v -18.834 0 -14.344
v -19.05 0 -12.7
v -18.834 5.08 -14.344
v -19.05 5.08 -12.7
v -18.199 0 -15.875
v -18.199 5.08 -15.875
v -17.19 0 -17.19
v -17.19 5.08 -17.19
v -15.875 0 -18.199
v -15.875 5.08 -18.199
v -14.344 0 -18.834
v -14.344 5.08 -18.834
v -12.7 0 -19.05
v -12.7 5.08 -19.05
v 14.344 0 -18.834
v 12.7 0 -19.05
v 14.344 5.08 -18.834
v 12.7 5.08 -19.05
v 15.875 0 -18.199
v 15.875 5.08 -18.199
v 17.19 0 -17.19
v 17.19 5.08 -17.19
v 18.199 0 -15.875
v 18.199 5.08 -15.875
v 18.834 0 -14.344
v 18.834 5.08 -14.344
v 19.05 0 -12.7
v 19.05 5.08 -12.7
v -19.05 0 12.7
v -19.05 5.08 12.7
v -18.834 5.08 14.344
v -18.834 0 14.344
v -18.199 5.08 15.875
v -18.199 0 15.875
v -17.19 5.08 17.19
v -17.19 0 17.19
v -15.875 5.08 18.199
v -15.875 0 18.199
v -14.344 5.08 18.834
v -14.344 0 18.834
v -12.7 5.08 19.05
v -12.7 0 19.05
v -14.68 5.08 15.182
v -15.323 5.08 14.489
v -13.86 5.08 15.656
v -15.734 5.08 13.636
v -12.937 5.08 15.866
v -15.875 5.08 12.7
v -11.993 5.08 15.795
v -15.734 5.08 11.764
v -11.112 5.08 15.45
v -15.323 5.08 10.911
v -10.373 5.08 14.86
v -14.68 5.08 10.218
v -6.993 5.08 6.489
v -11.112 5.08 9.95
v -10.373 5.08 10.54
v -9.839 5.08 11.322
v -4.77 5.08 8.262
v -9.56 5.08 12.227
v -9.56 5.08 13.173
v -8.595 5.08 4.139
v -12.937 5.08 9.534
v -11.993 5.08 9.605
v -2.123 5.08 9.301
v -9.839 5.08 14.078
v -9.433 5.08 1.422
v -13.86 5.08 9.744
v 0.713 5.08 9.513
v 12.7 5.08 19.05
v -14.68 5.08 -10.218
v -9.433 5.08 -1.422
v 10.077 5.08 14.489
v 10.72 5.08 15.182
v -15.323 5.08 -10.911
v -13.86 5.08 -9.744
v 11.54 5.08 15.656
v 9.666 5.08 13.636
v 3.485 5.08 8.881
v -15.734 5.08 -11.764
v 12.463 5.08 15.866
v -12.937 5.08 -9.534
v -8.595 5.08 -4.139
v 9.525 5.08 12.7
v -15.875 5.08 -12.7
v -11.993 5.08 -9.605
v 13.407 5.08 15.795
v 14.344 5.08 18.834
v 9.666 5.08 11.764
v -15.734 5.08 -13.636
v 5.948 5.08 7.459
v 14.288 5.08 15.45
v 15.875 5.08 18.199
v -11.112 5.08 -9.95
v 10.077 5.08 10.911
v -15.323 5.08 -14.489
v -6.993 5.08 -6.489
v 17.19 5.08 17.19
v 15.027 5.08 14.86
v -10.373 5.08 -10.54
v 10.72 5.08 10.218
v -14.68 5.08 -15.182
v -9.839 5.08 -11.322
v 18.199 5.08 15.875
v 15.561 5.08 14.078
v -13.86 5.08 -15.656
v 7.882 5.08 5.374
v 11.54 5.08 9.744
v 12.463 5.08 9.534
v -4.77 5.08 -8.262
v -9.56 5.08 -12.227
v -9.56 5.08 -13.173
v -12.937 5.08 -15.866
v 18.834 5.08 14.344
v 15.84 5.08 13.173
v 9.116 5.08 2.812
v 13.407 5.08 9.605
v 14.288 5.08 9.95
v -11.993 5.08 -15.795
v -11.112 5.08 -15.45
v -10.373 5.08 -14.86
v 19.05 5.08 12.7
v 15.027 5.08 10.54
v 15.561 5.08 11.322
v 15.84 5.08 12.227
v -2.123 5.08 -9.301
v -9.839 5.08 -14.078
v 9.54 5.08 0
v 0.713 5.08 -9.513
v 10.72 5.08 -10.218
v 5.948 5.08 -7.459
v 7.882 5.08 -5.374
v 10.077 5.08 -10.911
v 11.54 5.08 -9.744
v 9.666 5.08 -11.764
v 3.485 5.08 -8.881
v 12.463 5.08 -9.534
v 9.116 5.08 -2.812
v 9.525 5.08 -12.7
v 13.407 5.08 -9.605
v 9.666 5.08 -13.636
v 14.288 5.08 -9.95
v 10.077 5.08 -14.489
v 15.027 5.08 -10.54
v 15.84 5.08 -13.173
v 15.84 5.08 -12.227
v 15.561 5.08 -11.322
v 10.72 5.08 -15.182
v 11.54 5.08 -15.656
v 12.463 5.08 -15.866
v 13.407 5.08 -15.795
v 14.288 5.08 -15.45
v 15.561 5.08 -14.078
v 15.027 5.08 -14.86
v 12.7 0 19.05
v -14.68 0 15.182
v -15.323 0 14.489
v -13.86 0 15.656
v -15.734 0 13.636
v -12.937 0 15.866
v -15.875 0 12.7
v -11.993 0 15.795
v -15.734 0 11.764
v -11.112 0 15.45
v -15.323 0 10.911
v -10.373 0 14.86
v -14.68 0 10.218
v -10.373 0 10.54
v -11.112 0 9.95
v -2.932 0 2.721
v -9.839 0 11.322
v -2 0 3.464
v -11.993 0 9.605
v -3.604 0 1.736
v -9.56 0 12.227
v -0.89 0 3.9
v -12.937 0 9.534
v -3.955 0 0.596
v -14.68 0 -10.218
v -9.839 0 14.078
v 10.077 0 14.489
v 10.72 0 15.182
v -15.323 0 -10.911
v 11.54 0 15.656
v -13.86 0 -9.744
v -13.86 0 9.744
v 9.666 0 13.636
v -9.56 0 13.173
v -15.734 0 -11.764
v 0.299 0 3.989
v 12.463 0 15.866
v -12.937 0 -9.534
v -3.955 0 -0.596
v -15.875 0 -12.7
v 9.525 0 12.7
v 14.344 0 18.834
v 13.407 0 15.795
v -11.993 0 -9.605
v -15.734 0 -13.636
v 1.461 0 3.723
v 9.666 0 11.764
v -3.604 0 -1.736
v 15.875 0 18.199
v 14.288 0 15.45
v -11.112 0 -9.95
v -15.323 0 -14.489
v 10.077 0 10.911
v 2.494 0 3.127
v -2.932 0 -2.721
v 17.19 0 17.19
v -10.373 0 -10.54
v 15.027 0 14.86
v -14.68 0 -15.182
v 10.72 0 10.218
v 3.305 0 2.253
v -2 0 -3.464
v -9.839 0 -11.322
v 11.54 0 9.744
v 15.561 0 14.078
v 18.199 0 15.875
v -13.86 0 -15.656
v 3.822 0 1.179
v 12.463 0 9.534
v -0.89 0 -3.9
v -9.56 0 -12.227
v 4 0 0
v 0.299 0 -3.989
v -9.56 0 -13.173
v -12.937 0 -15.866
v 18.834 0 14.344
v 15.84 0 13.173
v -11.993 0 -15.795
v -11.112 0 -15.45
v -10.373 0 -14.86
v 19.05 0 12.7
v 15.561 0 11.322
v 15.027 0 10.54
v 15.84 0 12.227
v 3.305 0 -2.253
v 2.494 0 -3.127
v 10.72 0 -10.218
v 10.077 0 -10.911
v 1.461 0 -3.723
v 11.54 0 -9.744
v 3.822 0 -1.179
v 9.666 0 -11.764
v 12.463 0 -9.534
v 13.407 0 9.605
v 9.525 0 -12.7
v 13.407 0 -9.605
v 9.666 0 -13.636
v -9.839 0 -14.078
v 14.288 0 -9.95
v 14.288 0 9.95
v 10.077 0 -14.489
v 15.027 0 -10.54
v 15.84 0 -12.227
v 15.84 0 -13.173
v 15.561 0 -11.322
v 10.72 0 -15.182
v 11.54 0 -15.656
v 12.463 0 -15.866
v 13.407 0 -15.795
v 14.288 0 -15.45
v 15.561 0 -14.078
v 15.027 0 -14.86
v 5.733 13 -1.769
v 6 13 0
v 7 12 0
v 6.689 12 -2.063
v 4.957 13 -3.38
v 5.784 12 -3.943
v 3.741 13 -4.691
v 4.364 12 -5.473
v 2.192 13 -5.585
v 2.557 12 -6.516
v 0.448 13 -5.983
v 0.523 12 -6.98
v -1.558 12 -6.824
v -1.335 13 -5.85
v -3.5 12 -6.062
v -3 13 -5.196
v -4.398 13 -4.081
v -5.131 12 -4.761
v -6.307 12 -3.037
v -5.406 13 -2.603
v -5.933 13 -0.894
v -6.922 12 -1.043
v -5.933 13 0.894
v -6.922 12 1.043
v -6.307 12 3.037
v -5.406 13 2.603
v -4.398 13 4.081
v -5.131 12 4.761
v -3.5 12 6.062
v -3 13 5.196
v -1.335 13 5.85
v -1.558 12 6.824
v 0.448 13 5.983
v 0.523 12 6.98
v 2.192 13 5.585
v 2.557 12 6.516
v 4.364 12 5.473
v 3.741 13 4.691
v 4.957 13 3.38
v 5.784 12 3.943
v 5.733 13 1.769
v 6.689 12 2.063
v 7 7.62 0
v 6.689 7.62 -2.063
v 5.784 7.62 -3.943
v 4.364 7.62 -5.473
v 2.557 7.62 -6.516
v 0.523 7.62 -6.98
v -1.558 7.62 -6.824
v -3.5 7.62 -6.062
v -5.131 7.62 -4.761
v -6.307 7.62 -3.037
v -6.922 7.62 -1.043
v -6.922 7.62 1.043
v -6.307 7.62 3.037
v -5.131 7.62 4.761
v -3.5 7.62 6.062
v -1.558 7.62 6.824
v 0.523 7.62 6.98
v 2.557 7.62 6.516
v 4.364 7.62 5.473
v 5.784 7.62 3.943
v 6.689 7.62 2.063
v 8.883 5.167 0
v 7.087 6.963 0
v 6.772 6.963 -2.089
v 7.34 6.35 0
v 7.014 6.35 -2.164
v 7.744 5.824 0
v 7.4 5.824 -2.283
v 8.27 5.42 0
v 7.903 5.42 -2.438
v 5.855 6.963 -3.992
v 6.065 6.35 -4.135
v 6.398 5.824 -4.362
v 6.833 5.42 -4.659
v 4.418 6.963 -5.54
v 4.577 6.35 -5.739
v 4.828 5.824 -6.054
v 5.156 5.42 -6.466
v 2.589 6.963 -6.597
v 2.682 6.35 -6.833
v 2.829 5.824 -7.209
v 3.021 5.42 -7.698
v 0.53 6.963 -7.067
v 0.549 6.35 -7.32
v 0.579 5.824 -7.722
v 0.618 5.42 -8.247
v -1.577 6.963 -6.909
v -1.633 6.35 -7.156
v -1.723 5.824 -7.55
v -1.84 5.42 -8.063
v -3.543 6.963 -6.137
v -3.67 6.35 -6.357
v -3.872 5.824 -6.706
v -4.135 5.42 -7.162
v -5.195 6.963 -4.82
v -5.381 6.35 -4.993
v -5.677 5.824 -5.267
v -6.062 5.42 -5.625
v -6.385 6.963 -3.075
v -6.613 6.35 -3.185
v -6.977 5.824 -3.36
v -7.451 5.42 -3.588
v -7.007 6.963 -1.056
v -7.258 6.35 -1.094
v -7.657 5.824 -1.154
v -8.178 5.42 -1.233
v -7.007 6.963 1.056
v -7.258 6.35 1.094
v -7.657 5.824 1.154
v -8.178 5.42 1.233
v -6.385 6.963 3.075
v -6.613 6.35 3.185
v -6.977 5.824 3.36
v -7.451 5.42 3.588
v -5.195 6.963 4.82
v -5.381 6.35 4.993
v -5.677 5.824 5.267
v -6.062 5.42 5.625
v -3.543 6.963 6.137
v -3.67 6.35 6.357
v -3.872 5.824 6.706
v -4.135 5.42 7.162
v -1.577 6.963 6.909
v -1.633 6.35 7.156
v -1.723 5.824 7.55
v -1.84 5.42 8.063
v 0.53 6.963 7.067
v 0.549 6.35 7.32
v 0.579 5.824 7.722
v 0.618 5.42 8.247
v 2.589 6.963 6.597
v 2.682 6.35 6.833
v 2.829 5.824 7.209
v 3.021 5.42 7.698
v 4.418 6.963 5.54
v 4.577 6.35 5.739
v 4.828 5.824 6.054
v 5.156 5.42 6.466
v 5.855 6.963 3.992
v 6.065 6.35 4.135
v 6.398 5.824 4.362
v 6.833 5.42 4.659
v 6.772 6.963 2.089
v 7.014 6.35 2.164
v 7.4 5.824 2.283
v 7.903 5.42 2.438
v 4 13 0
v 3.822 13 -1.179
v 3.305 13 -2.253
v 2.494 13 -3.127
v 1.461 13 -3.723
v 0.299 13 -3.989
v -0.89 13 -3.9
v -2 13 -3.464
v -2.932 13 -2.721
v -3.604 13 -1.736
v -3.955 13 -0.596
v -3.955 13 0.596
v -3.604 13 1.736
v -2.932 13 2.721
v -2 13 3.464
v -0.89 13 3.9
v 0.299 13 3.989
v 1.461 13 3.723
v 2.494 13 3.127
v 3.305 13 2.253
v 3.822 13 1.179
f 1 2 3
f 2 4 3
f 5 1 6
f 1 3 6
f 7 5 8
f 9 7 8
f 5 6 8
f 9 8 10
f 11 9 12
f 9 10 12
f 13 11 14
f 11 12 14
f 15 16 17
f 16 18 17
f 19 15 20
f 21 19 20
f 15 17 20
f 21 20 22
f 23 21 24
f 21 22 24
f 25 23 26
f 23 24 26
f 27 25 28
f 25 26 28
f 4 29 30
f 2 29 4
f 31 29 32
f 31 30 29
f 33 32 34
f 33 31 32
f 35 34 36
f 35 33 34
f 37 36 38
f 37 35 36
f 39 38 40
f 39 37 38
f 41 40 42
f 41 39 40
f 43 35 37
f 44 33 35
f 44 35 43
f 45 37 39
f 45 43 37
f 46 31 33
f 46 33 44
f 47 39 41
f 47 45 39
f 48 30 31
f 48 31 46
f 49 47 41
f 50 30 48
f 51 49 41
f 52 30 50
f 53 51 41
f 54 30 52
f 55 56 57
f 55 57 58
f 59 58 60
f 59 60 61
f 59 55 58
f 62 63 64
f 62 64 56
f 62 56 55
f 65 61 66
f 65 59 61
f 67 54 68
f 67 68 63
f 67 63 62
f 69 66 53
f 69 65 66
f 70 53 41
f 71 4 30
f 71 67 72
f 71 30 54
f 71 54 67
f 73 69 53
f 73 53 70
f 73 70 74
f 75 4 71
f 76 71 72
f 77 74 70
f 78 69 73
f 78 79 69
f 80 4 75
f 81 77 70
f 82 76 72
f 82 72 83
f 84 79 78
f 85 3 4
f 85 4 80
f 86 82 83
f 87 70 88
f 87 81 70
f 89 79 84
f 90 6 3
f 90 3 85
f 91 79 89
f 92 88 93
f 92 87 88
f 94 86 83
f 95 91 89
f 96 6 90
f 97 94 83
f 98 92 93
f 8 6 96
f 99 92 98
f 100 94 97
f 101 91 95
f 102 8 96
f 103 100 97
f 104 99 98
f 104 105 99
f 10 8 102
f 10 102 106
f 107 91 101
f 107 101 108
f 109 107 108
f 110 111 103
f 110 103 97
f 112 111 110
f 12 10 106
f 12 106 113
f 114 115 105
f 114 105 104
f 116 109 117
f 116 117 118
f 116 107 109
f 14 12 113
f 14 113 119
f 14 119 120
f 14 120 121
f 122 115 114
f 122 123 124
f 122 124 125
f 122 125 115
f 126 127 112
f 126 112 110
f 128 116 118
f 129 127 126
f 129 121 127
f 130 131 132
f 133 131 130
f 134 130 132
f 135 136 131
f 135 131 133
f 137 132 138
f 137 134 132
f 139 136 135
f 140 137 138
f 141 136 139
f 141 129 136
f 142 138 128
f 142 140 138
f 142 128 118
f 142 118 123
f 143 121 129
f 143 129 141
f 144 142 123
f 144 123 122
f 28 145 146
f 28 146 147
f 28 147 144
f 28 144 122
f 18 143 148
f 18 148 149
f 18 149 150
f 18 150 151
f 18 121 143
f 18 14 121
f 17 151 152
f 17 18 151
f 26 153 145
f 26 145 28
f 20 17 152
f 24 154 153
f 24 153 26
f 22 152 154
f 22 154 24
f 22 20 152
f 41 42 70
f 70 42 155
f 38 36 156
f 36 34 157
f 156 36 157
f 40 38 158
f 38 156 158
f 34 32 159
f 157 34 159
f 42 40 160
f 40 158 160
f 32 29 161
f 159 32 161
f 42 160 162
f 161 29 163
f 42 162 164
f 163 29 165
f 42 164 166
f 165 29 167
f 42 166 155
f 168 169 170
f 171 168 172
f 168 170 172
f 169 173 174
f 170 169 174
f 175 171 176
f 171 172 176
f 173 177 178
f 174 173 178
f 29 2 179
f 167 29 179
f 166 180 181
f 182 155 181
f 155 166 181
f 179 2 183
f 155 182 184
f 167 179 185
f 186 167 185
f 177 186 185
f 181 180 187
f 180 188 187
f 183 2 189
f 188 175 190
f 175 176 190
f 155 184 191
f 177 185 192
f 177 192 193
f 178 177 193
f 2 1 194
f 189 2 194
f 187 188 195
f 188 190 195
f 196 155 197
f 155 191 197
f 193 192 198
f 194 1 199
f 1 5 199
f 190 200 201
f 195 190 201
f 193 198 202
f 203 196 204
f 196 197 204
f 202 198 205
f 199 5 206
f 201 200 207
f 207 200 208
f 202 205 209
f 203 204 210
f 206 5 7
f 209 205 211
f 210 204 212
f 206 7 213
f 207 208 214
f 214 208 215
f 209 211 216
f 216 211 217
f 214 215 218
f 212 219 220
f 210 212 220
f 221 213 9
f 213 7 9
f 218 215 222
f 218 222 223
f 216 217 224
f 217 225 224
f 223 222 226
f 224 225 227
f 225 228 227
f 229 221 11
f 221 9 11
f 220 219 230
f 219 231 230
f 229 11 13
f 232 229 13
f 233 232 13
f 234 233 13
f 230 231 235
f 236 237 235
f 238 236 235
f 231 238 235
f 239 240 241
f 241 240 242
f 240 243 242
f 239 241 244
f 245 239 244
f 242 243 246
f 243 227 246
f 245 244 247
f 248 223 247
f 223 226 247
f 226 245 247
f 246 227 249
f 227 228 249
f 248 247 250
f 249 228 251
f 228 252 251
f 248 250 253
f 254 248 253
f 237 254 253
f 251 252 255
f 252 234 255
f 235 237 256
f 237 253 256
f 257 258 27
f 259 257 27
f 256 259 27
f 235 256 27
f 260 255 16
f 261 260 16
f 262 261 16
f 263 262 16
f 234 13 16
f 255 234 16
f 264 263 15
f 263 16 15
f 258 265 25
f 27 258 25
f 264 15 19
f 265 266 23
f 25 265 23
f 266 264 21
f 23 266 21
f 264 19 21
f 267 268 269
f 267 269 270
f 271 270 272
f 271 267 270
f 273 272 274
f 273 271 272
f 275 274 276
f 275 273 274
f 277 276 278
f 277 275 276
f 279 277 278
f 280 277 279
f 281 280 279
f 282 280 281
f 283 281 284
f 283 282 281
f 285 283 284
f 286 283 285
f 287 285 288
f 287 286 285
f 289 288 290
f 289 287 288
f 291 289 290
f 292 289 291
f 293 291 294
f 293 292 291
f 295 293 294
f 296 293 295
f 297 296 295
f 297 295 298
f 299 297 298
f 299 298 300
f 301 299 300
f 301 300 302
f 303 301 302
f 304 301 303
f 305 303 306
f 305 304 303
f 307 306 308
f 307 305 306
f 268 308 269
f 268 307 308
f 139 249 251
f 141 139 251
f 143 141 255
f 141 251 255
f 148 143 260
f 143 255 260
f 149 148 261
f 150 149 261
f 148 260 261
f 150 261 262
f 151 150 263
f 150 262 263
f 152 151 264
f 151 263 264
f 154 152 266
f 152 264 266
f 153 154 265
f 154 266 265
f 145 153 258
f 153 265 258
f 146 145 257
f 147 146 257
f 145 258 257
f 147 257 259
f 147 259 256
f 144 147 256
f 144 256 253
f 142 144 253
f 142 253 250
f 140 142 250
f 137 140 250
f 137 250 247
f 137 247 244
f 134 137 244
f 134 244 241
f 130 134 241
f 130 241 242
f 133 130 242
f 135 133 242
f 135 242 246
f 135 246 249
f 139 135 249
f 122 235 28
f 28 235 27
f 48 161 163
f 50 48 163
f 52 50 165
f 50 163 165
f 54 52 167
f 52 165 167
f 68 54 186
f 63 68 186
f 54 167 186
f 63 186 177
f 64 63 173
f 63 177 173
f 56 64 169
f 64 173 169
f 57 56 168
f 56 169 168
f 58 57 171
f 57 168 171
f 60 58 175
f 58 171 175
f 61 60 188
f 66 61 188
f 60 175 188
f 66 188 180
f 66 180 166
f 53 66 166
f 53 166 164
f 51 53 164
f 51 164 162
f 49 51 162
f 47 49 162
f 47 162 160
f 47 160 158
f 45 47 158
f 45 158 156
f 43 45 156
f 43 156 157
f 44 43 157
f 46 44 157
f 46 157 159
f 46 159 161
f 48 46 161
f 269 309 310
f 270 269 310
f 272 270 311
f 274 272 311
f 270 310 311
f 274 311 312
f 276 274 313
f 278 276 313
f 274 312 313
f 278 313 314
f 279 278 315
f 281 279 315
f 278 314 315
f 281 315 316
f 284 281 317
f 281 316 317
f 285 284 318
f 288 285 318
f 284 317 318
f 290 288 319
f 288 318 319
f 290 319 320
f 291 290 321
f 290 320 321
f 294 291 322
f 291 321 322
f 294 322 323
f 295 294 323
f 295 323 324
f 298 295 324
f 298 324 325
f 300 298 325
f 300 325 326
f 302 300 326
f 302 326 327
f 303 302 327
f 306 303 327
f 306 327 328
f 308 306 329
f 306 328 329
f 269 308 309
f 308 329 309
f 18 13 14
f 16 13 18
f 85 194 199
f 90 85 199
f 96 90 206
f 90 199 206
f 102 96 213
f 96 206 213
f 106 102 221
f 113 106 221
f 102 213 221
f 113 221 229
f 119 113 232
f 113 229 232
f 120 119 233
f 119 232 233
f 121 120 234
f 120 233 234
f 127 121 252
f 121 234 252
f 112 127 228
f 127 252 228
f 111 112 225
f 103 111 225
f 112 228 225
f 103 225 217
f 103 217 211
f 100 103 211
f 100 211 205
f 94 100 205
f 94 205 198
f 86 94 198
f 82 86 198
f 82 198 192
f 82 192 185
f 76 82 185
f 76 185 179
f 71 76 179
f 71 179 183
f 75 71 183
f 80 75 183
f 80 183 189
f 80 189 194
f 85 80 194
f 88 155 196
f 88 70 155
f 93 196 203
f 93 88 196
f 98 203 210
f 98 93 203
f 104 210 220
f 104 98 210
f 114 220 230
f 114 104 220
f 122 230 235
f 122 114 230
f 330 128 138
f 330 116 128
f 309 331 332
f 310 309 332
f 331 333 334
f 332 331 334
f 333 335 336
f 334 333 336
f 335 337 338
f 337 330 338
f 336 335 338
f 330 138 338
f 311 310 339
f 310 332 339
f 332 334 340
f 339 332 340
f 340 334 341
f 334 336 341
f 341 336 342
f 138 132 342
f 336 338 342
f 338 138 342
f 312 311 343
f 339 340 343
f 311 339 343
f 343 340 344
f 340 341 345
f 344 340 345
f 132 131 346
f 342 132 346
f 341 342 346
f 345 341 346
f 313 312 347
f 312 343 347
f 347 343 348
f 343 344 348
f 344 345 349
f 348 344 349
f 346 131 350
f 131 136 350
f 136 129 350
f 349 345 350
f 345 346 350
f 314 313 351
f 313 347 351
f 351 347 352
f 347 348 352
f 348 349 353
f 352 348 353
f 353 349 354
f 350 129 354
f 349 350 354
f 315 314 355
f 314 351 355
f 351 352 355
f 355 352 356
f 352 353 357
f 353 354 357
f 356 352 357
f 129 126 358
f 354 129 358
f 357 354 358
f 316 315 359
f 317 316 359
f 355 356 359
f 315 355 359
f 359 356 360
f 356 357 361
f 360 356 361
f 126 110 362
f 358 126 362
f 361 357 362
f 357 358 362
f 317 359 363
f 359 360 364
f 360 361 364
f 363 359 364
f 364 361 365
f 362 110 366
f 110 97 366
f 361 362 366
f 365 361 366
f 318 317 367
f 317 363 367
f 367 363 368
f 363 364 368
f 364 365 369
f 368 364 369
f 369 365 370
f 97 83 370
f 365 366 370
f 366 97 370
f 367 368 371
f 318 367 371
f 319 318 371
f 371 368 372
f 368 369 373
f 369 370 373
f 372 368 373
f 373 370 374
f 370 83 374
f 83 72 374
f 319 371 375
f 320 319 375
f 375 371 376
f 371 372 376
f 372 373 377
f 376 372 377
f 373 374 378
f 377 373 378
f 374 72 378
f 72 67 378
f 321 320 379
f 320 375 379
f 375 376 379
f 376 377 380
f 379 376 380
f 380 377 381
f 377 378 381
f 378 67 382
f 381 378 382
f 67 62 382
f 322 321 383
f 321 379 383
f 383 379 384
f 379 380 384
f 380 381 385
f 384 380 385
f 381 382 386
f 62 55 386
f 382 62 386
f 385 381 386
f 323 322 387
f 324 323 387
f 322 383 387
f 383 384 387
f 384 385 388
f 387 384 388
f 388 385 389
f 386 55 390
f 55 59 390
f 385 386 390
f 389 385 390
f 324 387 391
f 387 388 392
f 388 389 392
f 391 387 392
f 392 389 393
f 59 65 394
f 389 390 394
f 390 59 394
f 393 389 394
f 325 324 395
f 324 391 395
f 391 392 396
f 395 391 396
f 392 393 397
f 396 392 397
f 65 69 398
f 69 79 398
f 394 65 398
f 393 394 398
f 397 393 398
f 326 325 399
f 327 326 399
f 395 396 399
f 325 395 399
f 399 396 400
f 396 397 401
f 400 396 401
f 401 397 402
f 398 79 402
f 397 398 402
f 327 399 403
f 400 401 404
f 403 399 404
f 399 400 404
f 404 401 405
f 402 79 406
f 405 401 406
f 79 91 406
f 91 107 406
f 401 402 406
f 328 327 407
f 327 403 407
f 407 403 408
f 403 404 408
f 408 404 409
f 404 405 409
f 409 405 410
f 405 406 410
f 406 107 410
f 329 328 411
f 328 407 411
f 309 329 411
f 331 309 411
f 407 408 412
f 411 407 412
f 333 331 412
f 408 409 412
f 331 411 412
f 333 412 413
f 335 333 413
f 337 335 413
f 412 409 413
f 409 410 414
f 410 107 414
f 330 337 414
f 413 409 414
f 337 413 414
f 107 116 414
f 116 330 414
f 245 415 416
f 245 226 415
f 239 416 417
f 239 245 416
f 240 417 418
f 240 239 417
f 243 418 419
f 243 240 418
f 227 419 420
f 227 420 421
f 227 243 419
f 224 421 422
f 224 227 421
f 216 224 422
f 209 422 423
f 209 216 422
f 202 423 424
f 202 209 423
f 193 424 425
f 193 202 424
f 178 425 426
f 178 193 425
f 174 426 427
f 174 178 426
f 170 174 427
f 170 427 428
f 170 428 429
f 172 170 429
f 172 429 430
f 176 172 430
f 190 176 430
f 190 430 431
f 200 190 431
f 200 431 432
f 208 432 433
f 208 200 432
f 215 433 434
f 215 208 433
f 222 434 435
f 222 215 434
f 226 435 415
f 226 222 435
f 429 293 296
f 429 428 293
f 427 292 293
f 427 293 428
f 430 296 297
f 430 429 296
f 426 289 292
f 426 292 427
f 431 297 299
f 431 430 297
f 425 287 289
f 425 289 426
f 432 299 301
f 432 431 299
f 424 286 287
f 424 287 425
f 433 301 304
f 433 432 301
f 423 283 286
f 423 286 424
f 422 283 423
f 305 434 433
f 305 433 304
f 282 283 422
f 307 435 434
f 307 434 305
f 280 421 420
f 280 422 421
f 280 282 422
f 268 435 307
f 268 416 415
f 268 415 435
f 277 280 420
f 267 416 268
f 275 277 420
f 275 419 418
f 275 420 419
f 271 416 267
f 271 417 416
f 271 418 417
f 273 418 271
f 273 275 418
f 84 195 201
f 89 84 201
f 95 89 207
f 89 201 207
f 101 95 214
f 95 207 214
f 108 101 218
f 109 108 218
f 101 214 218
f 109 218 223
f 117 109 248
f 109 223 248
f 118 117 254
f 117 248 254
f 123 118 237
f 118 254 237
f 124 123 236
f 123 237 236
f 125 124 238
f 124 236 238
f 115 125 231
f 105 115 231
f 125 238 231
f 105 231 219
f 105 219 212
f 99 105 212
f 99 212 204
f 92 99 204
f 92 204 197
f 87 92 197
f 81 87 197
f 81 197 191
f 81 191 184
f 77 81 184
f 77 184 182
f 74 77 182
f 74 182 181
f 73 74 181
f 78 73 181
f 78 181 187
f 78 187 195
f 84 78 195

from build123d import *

# Parameters (mm, degrees)
SKETCH1_W                   = 38.1
SKETCH1_H                   = 38.1
SKETCH1_R                   = 4
BOSS_EXTRUDE1_DEPTH         = 5.08
F_1_4_0_25_DIAMETER_HOLE1_D = 6.35
SKETCH5_R                   = 7
SKETCH5_R_2                 = 4
BOSS_EXTRUDE2_DEPTH         = 7.92
FILLET1_R                   = 2.54
CHAMFER1_SIZE               = 1
FILLET2_R                   = 6.35


with BuildPart() as part:
    # Sketch1 → Boss-Extrude1 (new body)
    with BuildSketch(Plane(origin=(0, 0, 0), x_dir=(1, 0, 0), z_dir=(0, 1, 0))):
        Rectangle(SKETCH1_W, SKETCH1_H)
        Circle(SKETCH1_R, mode=Mode.SUBTRACT)
    extrude(amount=BOSS_EXTRUDE1_DEPTH)

    # 1/4 (0.25) Diameter Hole1 (through all)
    with Locations(Plane(origin=(0, 5.08, 0), x_dir=(1, 0, 0), z_dir=(0, 1, 0))):
        with Locations((-12.7, 12.7), (12.7, 12.7), (12.7, -12.7), (-12.7, -12.7)):
            Hole(F_1_4_0_25_DIAMETER_HOLE1_D / 2)

    # Sketch5 → Boss-Extrude2 (add)
    with BuildSketch(Plane(origin=(0, 5.08, 0), x_dir=(1, 0, 0), z_dir=(0, 1, 0))):
        Circle(SKETCH5_R)
        Circle(SKETCH5_R_2, mode=Mode.SUBTRACT)
    extrude(amount=BOSS_EXTRUDE2_DEPTH)

    # Fillet1
    fillet1_edges = [part.edges().sort_by_distance(p)[0] for p in [
        (-7, 5.08, 0),
    ]]
    fillet(fillet1_edges, radius=FILLET1_R)

    # Chamfer1
    chamfer1_edges = [part.edges().sort_by_distance(p)[0] for p in [
        (-7, 13, 0),
    ]]
    chamfer(chamfer1_edges, length=CHAMFER1_SIZE)

    # Fillet2
    fillet2_edges = [part.edges().sort_by_distance(p)[0] for p in [
        (19.05, 2.54, 19.05),
        (-19.05, 2.54, 19.05),
        (-19.05, 2.54, -19.05),
        (19.05, 2.54, -19.05),
    ]]
    fillet(fillet2_edges, radius=FILLET2_R)


solid = part.part
